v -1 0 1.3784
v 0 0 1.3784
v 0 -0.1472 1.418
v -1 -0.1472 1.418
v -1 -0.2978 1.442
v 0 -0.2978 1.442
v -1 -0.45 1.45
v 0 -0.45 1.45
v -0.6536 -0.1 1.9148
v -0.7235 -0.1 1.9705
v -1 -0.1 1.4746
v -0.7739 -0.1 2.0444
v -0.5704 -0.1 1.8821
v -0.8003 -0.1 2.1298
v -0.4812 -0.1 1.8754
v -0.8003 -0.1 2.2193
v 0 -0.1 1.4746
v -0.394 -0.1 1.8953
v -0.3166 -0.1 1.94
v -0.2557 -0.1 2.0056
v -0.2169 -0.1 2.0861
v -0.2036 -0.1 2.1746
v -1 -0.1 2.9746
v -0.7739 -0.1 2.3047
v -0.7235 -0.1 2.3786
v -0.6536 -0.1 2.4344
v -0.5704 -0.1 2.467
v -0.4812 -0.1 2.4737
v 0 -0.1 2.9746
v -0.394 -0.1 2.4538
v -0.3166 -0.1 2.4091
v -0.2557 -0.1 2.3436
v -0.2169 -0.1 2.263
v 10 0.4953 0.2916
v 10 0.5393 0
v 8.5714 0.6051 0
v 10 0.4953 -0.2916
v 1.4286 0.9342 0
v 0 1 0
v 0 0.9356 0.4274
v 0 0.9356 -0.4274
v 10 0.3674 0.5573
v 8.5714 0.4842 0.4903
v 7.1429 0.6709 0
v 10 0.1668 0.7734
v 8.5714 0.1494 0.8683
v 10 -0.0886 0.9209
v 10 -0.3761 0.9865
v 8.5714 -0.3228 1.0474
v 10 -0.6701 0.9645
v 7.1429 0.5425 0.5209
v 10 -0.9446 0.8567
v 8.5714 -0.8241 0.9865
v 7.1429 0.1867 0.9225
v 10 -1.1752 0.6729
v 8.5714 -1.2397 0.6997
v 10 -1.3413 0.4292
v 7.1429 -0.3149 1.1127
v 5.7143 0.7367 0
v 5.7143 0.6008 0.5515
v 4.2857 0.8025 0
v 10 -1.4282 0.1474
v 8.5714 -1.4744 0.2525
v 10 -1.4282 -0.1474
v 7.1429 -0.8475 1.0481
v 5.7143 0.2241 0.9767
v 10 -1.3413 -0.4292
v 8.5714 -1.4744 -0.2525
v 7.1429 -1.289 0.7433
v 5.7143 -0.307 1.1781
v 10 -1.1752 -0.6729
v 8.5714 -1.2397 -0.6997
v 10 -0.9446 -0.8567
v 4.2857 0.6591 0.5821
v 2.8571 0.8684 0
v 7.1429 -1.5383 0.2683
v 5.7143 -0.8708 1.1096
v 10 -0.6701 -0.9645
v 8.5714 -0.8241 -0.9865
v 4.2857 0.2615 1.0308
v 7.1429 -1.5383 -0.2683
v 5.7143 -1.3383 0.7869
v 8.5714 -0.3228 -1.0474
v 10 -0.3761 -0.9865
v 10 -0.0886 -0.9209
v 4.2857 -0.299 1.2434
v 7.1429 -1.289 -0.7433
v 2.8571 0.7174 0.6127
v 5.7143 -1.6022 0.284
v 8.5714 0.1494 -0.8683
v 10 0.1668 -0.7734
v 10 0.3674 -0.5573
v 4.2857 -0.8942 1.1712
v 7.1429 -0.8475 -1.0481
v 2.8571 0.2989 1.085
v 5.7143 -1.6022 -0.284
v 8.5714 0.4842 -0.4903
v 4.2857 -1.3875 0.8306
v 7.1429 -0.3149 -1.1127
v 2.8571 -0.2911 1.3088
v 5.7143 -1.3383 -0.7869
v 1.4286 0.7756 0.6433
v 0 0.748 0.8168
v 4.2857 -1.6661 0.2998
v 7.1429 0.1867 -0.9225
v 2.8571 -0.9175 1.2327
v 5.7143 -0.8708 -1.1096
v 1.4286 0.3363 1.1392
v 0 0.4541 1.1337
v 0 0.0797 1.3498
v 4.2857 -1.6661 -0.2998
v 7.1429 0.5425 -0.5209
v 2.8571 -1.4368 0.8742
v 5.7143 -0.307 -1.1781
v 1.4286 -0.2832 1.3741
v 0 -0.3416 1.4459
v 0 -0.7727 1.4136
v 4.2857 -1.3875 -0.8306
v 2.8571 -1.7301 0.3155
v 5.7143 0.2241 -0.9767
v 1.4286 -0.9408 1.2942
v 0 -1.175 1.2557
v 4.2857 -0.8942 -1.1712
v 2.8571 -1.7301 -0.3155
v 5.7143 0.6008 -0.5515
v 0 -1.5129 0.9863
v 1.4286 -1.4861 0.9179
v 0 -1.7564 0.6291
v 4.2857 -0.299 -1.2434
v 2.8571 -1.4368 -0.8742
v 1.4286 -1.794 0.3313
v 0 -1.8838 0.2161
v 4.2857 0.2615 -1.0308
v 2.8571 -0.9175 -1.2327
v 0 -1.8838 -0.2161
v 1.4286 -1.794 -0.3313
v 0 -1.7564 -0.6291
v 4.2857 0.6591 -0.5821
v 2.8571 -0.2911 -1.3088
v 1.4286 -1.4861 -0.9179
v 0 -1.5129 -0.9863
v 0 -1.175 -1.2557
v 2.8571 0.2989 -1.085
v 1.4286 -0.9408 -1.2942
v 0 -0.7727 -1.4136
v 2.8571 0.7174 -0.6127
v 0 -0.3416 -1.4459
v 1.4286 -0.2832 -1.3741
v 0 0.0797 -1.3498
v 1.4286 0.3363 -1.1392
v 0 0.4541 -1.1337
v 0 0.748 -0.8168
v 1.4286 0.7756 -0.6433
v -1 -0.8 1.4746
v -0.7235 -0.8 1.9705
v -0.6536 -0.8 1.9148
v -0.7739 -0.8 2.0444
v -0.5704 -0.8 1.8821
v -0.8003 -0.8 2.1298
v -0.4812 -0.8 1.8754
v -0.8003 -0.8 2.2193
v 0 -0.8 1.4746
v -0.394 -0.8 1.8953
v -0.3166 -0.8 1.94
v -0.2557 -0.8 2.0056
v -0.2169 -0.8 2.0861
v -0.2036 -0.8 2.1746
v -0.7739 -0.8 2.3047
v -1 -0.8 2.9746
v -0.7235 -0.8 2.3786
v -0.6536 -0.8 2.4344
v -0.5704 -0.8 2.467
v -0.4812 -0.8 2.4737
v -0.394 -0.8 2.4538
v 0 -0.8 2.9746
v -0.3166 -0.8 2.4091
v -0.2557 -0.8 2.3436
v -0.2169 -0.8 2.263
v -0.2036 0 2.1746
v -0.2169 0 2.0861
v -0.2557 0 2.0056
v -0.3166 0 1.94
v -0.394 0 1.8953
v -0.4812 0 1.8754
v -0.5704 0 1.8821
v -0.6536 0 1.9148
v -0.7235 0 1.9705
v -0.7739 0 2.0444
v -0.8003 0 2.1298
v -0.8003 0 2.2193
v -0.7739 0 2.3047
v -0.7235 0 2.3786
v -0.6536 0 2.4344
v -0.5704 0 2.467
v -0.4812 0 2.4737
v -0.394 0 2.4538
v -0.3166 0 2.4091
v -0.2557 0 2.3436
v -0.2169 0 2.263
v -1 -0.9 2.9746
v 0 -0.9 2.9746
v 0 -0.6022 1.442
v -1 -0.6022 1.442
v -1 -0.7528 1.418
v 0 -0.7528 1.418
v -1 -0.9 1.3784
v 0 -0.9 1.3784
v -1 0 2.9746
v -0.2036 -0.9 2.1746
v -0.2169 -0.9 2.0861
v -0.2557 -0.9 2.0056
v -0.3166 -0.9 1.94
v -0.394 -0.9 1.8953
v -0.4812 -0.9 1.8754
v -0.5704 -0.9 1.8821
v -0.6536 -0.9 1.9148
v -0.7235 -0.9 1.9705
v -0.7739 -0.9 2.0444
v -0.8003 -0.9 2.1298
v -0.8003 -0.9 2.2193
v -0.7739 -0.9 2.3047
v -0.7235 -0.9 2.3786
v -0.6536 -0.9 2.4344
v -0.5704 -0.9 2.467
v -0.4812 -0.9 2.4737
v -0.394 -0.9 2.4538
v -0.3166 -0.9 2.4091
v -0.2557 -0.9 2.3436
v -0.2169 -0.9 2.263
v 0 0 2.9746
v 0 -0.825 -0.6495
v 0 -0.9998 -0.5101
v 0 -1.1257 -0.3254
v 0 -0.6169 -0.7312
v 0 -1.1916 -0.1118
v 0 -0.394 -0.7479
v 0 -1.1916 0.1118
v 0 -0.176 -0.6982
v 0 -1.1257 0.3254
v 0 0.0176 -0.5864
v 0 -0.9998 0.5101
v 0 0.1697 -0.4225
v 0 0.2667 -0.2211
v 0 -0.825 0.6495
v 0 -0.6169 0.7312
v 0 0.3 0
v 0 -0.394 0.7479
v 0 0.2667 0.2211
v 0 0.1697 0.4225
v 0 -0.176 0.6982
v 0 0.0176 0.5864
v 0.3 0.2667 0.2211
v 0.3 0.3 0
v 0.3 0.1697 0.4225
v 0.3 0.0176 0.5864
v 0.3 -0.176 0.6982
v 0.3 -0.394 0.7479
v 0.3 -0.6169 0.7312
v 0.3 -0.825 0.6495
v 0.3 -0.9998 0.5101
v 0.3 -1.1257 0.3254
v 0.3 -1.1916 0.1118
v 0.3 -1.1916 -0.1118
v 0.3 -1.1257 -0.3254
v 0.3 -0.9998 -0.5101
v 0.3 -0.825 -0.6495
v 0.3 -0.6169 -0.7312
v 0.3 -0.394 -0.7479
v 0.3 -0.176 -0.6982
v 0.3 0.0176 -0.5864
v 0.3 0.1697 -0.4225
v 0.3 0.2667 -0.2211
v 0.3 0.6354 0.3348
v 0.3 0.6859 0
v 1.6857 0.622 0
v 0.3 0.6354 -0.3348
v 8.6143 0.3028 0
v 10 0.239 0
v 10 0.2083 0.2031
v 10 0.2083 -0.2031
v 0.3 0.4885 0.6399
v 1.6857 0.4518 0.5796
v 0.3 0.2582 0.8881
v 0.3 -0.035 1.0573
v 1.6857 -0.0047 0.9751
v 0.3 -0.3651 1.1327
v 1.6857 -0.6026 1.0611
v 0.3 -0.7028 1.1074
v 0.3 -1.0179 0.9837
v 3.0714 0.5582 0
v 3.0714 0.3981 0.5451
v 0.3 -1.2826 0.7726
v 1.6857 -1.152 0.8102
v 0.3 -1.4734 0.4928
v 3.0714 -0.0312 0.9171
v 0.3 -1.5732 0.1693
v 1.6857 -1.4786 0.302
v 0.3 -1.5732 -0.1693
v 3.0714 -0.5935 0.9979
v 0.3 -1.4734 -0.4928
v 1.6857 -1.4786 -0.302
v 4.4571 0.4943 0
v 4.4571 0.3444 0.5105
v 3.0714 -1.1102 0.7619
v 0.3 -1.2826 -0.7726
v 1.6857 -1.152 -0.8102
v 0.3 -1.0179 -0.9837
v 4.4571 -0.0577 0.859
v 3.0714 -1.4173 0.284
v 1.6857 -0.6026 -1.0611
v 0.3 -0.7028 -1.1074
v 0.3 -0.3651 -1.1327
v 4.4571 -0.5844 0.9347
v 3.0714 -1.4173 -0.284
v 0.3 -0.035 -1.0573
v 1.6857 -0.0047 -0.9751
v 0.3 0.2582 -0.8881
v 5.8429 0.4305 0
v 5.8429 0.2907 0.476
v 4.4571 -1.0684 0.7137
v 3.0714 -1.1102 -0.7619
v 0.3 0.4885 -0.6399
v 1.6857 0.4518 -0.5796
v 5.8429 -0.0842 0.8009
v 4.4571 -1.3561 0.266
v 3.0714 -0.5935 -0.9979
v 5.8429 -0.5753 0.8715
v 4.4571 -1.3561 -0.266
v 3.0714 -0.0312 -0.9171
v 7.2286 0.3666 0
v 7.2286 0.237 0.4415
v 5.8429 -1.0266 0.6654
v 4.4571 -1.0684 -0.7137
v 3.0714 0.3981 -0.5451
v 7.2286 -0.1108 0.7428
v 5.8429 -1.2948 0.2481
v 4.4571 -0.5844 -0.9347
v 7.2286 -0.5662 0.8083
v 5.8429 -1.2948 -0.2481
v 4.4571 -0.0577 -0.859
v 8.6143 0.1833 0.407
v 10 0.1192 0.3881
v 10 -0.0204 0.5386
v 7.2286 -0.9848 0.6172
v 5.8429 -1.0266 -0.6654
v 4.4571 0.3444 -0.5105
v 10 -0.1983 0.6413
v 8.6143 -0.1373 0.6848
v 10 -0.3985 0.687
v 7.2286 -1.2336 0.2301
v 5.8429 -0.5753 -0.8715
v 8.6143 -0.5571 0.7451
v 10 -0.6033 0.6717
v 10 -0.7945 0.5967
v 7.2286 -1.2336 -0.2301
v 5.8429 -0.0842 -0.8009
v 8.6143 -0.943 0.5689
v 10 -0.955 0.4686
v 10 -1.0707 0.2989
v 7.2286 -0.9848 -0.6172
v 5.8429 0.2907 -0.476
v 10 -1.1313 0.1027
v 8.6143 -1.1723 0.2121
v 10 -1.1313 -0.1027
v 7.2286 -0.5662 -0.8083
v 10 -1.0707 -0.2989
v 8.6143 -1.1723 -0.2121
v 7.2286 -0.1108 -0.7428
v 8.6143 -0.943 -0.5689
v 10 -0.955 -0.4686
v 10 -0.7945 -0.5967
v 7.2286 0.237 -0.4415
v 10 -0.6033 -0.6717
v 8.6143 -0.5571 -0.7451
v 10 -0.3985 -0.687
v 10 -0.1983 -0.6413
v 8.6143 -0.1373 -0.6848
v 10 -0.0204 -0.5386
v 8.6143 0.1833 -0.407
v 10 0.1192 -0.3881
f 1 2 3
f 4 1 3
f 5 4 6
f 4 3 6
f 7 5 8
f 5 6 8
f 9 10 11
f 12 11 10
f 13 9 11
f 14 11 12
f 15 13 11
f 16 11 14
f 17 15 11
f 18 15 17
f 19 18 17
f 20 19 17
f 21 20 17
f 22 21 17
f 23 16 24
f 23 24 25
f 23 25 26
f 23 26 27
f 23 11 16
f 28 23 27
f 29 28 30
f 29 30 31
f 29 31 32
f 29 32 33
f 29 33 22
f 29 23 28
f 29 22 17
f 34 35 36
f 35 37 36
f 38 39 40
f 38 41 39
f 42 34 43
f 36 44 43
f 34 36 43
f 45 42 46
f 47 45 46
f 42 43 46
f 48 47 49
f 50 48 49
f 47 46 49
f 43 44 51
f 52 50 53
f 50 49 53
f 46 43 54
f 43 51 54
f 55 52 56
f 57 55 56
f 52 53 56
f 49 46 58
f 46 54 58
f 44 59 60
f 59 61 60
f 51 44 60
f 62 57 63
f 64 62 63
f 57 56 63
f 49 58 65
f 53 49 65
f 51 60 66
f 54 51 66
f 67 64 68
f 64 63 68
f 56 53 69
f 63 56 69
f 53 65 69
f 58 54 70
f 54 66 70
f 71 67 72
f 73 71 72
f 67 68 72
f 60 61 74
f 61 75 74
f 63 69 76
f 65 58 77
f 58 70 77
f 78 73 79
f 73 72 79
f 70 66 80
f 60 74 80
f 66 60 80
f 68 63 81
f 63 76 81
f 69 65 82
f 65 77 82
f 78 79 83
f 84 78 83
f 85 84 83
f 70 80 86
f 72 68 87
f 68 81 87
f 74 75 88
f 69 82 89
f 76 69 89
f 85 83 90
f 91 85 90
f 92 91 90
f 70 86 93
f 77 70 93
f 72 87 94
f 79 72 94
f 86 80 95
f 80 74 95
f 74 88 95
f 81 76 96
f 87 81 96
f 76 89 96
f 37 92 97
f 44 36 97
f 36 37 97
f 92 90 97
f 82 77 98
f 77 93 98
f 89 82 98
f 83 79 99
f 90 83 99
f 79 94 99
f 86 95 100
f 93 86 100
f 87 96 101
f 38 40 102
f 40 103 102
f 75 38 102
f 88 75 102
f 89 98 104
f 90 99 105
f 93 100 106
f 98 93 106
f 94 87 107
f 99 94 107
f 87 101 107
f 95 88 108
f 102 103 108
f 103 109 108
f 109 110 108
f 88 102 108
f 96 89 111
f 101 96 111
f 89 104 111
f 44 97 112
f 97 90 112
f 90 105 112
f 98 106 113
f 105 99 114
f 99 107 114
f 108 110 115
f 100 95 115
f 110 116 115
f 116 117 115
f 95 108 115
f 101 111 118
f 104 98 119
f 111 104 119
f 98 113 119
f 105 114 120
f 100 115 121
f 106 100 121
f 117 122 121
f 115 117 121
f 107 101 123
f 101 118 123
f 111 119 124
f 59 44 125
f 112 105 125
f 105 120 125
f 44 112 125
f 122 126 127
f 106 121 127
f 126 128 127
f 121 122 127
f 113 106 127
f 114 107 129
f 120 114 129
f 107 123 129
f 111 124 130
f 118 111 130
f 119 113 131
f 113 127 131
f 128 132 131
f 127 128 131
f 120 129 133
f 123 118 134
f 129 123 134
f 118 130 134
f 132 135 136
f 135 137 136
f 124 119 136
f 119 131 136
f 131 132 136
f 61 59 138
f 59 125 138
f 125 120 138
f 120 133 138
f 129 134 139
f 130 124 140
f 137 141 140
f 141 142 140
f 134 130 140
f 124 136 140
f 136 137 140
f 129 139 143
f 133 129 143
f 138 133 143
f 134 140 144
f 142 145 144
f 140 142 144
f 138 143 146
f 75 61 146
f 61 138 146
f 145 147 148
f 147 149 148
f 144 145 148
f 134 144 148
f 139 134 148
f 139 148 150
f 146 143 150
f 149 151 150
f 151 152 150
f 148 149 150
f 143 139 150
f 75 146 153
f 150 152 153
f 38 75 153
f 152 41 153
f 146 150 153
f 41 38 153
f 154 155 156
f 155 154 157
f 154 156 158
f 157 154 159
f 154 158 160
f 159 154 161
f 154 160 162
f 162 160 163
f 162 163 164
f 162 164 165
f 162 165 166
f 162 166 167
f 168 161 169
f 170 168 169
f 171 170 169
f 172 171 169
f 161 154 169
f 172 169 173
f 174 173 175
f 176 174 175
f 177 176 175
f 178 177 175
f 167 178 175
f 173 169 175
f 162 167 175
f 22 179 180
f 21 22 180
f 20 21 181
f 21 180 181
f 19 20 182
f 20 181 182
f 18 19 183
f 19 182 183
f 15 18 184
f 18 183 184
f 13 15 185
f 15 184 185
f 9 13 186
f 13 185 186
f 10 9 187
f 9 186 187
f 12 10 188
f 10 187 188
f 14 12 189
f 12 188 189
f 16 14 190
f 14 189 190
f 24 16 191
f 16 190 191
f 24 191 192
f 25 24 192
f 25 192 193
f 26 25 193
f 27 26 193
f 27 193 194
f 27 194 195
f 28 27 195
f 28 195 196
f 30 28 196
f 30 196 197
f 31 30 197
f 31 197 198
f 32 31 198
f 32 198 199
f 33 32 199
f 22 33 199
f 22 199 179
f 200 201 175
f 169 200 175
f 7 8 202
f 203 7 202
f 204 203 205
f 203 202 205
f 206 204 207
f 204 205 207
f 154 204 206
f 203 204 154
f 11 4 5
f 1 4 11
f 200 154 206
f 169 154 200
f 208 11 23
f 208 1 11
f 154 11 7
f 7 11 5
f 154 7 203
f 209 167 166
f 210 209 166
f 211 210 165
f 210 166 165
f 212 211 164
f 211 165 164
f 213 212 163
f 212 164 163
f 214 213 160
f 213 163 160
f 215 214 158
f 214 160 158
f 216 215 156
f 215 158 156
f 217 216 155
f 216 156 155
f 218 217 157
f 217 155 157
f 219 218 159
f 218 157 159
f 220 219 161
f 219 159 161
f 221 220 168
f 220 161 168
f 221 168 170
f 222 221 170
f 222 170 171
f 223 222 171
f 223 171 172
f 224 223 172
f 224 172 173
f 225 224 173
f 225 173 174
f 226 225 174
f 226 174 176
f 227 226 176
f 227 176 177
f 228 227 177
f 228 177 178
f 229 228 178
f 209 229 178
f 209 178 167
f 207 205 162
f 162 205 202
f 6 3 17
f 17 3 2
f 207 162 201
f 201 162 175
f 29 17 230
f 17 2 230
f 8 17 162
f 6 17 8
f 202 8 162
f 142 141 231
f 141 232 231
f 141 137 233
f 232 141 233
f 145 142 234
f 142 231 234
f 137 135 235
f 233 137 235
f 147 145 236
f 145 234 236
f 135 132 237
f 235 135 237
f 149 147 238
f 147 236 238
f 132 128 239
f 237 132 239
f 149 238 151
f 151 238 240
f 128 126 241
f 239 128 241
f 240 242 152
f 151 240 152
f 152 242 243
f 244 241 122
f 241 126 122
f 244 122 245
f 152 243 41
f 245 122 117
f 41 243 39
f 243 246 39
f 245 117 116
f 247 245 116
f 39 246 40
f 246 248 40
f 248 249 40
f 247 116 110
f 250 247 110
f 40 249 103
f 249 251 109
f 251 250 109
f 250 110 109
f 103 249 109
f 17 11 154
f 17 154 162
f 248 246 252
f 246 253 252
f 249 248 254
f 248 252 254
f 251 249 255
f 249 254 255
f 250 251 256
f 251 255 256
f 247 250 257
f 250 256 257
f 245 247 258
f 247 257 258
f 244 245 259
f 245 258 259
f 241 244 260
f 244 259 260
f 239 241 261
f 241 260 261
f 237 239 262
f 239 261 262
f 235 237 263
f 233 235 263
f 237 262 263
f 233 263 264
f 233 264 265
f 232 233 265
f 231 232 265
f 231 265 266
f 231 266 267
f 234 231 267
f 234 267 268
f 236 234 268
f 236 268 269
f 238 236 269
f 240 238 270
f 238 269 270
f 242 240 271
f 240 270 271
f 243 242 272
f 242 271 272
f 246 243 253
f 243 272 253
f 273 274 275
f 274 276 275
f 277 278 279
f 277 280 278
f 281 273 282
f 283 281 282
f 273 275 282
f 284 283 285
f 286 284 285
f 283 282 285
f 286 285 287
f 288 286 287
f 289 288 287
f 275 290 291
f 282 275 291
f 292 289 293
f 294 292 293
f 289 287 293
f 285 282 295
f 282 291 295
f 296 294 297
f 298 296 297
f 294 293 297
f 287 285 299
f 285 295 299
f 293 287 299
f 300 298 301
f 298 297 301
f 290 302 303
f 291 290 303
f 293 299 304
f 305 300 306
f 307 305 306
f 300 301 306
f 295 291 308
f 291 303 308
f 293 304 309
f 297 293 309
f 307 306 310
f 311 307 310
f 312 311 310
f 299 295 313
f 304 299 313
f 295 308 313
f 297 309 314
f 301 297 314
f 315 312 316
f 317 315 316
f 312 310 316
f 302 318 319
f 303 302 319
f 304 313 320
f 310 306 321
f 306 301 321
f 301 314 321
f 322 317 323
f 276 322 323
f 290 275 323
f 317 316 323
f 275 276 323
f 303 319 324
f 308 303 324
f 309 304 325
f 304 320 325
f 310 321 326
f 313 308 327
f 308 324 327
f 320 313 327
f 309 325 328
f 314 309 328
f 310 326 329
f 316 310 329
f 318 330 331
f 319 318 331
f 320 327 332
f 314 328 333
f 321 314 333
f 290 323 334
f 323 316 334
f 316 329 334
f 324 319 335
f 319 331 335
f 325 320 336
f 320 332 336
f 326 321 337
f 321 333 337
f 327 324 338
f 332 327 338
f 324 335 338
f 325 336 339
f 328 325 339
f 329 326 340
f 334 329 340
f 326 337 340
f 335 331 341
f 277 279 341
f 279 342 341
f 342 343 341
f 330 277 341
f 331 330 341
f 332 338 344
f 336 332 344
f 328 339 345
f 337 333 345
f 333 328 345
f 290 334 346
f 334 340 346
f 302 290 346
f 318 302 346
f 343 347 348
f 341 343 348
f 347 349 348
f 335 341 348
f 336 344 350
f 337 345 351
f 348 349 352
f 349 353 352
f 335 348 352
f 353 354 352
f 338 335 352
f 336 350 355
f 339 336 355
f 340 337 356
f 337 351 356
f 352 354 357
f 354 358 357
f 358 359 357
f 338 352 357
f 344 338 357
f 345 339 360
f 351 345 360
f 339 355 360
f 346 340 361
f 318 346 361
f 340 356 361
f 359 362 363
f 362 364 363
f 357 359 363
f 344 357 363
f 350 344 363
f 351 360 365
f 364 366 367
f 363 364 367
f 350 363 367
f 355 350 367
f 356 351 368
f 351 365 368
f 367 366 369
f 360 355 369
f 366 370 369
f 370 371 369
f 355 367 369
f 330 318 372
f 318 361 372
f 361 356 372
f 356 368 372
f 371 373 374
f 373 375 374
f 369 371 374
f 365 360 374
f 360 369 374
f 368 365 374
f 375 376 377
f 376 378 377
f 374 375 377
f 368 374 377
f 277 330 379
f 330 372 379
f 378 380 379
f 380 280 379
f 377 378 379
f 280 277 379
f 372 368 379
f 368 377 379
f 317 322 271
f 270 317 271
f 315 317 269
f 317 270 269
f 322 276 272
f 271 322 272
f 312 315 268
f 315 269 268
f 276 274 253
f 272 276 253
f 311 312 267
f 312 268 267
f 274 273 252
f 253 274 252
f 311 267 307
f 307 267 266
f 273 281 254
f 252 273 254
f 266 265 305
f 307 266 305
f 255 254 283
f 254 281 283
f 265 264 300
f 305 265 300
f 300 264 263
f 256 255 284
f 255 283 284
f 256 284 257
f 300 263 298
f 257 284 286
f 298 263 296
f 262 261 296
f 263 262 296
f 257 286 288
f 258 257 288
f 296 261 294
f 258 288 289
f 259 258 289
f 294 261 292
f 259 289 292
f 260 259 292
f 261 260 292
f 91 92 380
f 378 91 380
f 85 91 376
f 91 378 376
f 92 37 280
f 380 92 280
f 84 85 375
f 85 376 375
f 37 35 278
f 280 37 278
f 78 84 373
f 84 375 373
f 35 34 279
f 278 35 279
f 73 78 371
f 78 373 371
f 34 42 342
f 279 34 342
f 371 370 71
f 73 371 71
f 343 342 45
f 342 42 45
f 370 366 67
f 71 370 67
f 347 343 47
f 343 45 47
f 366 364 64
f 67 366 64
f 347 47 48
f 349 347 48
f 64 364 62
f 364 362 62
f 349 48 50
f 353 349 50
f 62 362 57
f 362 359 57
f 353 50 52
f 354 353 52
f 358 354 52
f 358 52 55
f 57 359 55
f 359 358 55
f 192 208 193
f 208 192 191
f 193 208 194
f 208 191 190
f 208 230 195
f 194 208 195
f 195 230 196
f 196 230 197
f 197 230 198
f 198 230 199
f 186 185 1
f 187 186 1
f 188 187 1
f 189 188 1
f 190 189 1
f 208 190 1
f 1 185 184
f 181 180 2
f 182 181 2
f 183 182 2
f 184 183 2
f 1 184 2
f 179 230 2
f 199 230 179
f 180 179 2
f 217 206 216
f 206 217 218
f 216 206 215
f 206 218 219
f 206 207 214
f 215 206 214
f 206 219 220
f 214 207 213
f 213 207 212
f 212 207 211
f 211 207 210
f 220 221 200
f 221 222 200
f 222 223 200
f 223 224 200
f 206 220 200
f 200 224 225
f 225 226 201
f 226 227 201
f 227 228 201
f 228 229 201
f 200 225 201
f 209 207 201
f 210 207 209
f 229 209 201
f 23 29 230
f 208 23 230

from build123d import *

# Parameters (mm, degrees)
BOSS_EXTRUDE1_DEPTH = 1
SKETCH5_R           = 0.3
CUT_EXTRUDE2_DEPTH  = 1
SKETCH6_W           = 1
SKETCH6_H           = 0.7
CUT_EXTRUDE3_DEPTH  = 1.5


with BuildPart() as part:
    # Sketch2 → Revolve2 (revolve)
    with BuildSketch(Plane.XY):
        Polygon((0, 1), (0, 0.3), (0.3, 0.3), (0.3, 0.68585997), (10, 0.238955255), (10, 0.539273489), align=None)
    revolve(axis=Axis((0, -0.45, 0), (1, 0, 0)))


with BuildPart() as body_2:
    # Sketch3 → Boss-Extrude1 (new body)
    with BuildSketch(Plane.ZY):
        with BuildLine():
            Line((2.974562536, 0), (1.378404875, 0))
            ThreePointArc((1.378404875, 0), (1.431989363, -0.222170095), (1.45, -0.45))
            ThreePointArc((1.45, -0.45), (1.431989363, -0.677829905), (1.378404875, -0.9))
            Line((1.378404875, -0.9), (2.974562536, -0.9))
            Line((2.974562536, -0.9), (2.974562536, 0))
        make_face()
    extrude(amount=BOSS_EXTRUDE1_DEPTH)

    # Sketch5 → Cut-Extrude2 (cut)
    with BuildSketch(Plane(origin=(0, 0, 0), x_dir=(1, 0, 0), z_dir=(0, 1, 0))):
        with Locations((-0.50361821, -2.174562536)):
            Circle(SKETCH5_R)
    extrude(amount=-CUT_EXTRUDE2_DEPTH, mode=Mode.SUBTRACT)

    # Sketch6 → Cut-Extrude3 (cut)
    with BuildSketch(Plane.XY.offset(2.974562536)):
        with Locations((-0.5, -0.45)):
            Rectangle(SKETCH6_W, SKETCH6_H)
    extrude(amount=-CUT_EXTRUDE3_DEPTH, mode=Mode.SUBTRACT)


solid = Compound([part.part, body_2.part])
